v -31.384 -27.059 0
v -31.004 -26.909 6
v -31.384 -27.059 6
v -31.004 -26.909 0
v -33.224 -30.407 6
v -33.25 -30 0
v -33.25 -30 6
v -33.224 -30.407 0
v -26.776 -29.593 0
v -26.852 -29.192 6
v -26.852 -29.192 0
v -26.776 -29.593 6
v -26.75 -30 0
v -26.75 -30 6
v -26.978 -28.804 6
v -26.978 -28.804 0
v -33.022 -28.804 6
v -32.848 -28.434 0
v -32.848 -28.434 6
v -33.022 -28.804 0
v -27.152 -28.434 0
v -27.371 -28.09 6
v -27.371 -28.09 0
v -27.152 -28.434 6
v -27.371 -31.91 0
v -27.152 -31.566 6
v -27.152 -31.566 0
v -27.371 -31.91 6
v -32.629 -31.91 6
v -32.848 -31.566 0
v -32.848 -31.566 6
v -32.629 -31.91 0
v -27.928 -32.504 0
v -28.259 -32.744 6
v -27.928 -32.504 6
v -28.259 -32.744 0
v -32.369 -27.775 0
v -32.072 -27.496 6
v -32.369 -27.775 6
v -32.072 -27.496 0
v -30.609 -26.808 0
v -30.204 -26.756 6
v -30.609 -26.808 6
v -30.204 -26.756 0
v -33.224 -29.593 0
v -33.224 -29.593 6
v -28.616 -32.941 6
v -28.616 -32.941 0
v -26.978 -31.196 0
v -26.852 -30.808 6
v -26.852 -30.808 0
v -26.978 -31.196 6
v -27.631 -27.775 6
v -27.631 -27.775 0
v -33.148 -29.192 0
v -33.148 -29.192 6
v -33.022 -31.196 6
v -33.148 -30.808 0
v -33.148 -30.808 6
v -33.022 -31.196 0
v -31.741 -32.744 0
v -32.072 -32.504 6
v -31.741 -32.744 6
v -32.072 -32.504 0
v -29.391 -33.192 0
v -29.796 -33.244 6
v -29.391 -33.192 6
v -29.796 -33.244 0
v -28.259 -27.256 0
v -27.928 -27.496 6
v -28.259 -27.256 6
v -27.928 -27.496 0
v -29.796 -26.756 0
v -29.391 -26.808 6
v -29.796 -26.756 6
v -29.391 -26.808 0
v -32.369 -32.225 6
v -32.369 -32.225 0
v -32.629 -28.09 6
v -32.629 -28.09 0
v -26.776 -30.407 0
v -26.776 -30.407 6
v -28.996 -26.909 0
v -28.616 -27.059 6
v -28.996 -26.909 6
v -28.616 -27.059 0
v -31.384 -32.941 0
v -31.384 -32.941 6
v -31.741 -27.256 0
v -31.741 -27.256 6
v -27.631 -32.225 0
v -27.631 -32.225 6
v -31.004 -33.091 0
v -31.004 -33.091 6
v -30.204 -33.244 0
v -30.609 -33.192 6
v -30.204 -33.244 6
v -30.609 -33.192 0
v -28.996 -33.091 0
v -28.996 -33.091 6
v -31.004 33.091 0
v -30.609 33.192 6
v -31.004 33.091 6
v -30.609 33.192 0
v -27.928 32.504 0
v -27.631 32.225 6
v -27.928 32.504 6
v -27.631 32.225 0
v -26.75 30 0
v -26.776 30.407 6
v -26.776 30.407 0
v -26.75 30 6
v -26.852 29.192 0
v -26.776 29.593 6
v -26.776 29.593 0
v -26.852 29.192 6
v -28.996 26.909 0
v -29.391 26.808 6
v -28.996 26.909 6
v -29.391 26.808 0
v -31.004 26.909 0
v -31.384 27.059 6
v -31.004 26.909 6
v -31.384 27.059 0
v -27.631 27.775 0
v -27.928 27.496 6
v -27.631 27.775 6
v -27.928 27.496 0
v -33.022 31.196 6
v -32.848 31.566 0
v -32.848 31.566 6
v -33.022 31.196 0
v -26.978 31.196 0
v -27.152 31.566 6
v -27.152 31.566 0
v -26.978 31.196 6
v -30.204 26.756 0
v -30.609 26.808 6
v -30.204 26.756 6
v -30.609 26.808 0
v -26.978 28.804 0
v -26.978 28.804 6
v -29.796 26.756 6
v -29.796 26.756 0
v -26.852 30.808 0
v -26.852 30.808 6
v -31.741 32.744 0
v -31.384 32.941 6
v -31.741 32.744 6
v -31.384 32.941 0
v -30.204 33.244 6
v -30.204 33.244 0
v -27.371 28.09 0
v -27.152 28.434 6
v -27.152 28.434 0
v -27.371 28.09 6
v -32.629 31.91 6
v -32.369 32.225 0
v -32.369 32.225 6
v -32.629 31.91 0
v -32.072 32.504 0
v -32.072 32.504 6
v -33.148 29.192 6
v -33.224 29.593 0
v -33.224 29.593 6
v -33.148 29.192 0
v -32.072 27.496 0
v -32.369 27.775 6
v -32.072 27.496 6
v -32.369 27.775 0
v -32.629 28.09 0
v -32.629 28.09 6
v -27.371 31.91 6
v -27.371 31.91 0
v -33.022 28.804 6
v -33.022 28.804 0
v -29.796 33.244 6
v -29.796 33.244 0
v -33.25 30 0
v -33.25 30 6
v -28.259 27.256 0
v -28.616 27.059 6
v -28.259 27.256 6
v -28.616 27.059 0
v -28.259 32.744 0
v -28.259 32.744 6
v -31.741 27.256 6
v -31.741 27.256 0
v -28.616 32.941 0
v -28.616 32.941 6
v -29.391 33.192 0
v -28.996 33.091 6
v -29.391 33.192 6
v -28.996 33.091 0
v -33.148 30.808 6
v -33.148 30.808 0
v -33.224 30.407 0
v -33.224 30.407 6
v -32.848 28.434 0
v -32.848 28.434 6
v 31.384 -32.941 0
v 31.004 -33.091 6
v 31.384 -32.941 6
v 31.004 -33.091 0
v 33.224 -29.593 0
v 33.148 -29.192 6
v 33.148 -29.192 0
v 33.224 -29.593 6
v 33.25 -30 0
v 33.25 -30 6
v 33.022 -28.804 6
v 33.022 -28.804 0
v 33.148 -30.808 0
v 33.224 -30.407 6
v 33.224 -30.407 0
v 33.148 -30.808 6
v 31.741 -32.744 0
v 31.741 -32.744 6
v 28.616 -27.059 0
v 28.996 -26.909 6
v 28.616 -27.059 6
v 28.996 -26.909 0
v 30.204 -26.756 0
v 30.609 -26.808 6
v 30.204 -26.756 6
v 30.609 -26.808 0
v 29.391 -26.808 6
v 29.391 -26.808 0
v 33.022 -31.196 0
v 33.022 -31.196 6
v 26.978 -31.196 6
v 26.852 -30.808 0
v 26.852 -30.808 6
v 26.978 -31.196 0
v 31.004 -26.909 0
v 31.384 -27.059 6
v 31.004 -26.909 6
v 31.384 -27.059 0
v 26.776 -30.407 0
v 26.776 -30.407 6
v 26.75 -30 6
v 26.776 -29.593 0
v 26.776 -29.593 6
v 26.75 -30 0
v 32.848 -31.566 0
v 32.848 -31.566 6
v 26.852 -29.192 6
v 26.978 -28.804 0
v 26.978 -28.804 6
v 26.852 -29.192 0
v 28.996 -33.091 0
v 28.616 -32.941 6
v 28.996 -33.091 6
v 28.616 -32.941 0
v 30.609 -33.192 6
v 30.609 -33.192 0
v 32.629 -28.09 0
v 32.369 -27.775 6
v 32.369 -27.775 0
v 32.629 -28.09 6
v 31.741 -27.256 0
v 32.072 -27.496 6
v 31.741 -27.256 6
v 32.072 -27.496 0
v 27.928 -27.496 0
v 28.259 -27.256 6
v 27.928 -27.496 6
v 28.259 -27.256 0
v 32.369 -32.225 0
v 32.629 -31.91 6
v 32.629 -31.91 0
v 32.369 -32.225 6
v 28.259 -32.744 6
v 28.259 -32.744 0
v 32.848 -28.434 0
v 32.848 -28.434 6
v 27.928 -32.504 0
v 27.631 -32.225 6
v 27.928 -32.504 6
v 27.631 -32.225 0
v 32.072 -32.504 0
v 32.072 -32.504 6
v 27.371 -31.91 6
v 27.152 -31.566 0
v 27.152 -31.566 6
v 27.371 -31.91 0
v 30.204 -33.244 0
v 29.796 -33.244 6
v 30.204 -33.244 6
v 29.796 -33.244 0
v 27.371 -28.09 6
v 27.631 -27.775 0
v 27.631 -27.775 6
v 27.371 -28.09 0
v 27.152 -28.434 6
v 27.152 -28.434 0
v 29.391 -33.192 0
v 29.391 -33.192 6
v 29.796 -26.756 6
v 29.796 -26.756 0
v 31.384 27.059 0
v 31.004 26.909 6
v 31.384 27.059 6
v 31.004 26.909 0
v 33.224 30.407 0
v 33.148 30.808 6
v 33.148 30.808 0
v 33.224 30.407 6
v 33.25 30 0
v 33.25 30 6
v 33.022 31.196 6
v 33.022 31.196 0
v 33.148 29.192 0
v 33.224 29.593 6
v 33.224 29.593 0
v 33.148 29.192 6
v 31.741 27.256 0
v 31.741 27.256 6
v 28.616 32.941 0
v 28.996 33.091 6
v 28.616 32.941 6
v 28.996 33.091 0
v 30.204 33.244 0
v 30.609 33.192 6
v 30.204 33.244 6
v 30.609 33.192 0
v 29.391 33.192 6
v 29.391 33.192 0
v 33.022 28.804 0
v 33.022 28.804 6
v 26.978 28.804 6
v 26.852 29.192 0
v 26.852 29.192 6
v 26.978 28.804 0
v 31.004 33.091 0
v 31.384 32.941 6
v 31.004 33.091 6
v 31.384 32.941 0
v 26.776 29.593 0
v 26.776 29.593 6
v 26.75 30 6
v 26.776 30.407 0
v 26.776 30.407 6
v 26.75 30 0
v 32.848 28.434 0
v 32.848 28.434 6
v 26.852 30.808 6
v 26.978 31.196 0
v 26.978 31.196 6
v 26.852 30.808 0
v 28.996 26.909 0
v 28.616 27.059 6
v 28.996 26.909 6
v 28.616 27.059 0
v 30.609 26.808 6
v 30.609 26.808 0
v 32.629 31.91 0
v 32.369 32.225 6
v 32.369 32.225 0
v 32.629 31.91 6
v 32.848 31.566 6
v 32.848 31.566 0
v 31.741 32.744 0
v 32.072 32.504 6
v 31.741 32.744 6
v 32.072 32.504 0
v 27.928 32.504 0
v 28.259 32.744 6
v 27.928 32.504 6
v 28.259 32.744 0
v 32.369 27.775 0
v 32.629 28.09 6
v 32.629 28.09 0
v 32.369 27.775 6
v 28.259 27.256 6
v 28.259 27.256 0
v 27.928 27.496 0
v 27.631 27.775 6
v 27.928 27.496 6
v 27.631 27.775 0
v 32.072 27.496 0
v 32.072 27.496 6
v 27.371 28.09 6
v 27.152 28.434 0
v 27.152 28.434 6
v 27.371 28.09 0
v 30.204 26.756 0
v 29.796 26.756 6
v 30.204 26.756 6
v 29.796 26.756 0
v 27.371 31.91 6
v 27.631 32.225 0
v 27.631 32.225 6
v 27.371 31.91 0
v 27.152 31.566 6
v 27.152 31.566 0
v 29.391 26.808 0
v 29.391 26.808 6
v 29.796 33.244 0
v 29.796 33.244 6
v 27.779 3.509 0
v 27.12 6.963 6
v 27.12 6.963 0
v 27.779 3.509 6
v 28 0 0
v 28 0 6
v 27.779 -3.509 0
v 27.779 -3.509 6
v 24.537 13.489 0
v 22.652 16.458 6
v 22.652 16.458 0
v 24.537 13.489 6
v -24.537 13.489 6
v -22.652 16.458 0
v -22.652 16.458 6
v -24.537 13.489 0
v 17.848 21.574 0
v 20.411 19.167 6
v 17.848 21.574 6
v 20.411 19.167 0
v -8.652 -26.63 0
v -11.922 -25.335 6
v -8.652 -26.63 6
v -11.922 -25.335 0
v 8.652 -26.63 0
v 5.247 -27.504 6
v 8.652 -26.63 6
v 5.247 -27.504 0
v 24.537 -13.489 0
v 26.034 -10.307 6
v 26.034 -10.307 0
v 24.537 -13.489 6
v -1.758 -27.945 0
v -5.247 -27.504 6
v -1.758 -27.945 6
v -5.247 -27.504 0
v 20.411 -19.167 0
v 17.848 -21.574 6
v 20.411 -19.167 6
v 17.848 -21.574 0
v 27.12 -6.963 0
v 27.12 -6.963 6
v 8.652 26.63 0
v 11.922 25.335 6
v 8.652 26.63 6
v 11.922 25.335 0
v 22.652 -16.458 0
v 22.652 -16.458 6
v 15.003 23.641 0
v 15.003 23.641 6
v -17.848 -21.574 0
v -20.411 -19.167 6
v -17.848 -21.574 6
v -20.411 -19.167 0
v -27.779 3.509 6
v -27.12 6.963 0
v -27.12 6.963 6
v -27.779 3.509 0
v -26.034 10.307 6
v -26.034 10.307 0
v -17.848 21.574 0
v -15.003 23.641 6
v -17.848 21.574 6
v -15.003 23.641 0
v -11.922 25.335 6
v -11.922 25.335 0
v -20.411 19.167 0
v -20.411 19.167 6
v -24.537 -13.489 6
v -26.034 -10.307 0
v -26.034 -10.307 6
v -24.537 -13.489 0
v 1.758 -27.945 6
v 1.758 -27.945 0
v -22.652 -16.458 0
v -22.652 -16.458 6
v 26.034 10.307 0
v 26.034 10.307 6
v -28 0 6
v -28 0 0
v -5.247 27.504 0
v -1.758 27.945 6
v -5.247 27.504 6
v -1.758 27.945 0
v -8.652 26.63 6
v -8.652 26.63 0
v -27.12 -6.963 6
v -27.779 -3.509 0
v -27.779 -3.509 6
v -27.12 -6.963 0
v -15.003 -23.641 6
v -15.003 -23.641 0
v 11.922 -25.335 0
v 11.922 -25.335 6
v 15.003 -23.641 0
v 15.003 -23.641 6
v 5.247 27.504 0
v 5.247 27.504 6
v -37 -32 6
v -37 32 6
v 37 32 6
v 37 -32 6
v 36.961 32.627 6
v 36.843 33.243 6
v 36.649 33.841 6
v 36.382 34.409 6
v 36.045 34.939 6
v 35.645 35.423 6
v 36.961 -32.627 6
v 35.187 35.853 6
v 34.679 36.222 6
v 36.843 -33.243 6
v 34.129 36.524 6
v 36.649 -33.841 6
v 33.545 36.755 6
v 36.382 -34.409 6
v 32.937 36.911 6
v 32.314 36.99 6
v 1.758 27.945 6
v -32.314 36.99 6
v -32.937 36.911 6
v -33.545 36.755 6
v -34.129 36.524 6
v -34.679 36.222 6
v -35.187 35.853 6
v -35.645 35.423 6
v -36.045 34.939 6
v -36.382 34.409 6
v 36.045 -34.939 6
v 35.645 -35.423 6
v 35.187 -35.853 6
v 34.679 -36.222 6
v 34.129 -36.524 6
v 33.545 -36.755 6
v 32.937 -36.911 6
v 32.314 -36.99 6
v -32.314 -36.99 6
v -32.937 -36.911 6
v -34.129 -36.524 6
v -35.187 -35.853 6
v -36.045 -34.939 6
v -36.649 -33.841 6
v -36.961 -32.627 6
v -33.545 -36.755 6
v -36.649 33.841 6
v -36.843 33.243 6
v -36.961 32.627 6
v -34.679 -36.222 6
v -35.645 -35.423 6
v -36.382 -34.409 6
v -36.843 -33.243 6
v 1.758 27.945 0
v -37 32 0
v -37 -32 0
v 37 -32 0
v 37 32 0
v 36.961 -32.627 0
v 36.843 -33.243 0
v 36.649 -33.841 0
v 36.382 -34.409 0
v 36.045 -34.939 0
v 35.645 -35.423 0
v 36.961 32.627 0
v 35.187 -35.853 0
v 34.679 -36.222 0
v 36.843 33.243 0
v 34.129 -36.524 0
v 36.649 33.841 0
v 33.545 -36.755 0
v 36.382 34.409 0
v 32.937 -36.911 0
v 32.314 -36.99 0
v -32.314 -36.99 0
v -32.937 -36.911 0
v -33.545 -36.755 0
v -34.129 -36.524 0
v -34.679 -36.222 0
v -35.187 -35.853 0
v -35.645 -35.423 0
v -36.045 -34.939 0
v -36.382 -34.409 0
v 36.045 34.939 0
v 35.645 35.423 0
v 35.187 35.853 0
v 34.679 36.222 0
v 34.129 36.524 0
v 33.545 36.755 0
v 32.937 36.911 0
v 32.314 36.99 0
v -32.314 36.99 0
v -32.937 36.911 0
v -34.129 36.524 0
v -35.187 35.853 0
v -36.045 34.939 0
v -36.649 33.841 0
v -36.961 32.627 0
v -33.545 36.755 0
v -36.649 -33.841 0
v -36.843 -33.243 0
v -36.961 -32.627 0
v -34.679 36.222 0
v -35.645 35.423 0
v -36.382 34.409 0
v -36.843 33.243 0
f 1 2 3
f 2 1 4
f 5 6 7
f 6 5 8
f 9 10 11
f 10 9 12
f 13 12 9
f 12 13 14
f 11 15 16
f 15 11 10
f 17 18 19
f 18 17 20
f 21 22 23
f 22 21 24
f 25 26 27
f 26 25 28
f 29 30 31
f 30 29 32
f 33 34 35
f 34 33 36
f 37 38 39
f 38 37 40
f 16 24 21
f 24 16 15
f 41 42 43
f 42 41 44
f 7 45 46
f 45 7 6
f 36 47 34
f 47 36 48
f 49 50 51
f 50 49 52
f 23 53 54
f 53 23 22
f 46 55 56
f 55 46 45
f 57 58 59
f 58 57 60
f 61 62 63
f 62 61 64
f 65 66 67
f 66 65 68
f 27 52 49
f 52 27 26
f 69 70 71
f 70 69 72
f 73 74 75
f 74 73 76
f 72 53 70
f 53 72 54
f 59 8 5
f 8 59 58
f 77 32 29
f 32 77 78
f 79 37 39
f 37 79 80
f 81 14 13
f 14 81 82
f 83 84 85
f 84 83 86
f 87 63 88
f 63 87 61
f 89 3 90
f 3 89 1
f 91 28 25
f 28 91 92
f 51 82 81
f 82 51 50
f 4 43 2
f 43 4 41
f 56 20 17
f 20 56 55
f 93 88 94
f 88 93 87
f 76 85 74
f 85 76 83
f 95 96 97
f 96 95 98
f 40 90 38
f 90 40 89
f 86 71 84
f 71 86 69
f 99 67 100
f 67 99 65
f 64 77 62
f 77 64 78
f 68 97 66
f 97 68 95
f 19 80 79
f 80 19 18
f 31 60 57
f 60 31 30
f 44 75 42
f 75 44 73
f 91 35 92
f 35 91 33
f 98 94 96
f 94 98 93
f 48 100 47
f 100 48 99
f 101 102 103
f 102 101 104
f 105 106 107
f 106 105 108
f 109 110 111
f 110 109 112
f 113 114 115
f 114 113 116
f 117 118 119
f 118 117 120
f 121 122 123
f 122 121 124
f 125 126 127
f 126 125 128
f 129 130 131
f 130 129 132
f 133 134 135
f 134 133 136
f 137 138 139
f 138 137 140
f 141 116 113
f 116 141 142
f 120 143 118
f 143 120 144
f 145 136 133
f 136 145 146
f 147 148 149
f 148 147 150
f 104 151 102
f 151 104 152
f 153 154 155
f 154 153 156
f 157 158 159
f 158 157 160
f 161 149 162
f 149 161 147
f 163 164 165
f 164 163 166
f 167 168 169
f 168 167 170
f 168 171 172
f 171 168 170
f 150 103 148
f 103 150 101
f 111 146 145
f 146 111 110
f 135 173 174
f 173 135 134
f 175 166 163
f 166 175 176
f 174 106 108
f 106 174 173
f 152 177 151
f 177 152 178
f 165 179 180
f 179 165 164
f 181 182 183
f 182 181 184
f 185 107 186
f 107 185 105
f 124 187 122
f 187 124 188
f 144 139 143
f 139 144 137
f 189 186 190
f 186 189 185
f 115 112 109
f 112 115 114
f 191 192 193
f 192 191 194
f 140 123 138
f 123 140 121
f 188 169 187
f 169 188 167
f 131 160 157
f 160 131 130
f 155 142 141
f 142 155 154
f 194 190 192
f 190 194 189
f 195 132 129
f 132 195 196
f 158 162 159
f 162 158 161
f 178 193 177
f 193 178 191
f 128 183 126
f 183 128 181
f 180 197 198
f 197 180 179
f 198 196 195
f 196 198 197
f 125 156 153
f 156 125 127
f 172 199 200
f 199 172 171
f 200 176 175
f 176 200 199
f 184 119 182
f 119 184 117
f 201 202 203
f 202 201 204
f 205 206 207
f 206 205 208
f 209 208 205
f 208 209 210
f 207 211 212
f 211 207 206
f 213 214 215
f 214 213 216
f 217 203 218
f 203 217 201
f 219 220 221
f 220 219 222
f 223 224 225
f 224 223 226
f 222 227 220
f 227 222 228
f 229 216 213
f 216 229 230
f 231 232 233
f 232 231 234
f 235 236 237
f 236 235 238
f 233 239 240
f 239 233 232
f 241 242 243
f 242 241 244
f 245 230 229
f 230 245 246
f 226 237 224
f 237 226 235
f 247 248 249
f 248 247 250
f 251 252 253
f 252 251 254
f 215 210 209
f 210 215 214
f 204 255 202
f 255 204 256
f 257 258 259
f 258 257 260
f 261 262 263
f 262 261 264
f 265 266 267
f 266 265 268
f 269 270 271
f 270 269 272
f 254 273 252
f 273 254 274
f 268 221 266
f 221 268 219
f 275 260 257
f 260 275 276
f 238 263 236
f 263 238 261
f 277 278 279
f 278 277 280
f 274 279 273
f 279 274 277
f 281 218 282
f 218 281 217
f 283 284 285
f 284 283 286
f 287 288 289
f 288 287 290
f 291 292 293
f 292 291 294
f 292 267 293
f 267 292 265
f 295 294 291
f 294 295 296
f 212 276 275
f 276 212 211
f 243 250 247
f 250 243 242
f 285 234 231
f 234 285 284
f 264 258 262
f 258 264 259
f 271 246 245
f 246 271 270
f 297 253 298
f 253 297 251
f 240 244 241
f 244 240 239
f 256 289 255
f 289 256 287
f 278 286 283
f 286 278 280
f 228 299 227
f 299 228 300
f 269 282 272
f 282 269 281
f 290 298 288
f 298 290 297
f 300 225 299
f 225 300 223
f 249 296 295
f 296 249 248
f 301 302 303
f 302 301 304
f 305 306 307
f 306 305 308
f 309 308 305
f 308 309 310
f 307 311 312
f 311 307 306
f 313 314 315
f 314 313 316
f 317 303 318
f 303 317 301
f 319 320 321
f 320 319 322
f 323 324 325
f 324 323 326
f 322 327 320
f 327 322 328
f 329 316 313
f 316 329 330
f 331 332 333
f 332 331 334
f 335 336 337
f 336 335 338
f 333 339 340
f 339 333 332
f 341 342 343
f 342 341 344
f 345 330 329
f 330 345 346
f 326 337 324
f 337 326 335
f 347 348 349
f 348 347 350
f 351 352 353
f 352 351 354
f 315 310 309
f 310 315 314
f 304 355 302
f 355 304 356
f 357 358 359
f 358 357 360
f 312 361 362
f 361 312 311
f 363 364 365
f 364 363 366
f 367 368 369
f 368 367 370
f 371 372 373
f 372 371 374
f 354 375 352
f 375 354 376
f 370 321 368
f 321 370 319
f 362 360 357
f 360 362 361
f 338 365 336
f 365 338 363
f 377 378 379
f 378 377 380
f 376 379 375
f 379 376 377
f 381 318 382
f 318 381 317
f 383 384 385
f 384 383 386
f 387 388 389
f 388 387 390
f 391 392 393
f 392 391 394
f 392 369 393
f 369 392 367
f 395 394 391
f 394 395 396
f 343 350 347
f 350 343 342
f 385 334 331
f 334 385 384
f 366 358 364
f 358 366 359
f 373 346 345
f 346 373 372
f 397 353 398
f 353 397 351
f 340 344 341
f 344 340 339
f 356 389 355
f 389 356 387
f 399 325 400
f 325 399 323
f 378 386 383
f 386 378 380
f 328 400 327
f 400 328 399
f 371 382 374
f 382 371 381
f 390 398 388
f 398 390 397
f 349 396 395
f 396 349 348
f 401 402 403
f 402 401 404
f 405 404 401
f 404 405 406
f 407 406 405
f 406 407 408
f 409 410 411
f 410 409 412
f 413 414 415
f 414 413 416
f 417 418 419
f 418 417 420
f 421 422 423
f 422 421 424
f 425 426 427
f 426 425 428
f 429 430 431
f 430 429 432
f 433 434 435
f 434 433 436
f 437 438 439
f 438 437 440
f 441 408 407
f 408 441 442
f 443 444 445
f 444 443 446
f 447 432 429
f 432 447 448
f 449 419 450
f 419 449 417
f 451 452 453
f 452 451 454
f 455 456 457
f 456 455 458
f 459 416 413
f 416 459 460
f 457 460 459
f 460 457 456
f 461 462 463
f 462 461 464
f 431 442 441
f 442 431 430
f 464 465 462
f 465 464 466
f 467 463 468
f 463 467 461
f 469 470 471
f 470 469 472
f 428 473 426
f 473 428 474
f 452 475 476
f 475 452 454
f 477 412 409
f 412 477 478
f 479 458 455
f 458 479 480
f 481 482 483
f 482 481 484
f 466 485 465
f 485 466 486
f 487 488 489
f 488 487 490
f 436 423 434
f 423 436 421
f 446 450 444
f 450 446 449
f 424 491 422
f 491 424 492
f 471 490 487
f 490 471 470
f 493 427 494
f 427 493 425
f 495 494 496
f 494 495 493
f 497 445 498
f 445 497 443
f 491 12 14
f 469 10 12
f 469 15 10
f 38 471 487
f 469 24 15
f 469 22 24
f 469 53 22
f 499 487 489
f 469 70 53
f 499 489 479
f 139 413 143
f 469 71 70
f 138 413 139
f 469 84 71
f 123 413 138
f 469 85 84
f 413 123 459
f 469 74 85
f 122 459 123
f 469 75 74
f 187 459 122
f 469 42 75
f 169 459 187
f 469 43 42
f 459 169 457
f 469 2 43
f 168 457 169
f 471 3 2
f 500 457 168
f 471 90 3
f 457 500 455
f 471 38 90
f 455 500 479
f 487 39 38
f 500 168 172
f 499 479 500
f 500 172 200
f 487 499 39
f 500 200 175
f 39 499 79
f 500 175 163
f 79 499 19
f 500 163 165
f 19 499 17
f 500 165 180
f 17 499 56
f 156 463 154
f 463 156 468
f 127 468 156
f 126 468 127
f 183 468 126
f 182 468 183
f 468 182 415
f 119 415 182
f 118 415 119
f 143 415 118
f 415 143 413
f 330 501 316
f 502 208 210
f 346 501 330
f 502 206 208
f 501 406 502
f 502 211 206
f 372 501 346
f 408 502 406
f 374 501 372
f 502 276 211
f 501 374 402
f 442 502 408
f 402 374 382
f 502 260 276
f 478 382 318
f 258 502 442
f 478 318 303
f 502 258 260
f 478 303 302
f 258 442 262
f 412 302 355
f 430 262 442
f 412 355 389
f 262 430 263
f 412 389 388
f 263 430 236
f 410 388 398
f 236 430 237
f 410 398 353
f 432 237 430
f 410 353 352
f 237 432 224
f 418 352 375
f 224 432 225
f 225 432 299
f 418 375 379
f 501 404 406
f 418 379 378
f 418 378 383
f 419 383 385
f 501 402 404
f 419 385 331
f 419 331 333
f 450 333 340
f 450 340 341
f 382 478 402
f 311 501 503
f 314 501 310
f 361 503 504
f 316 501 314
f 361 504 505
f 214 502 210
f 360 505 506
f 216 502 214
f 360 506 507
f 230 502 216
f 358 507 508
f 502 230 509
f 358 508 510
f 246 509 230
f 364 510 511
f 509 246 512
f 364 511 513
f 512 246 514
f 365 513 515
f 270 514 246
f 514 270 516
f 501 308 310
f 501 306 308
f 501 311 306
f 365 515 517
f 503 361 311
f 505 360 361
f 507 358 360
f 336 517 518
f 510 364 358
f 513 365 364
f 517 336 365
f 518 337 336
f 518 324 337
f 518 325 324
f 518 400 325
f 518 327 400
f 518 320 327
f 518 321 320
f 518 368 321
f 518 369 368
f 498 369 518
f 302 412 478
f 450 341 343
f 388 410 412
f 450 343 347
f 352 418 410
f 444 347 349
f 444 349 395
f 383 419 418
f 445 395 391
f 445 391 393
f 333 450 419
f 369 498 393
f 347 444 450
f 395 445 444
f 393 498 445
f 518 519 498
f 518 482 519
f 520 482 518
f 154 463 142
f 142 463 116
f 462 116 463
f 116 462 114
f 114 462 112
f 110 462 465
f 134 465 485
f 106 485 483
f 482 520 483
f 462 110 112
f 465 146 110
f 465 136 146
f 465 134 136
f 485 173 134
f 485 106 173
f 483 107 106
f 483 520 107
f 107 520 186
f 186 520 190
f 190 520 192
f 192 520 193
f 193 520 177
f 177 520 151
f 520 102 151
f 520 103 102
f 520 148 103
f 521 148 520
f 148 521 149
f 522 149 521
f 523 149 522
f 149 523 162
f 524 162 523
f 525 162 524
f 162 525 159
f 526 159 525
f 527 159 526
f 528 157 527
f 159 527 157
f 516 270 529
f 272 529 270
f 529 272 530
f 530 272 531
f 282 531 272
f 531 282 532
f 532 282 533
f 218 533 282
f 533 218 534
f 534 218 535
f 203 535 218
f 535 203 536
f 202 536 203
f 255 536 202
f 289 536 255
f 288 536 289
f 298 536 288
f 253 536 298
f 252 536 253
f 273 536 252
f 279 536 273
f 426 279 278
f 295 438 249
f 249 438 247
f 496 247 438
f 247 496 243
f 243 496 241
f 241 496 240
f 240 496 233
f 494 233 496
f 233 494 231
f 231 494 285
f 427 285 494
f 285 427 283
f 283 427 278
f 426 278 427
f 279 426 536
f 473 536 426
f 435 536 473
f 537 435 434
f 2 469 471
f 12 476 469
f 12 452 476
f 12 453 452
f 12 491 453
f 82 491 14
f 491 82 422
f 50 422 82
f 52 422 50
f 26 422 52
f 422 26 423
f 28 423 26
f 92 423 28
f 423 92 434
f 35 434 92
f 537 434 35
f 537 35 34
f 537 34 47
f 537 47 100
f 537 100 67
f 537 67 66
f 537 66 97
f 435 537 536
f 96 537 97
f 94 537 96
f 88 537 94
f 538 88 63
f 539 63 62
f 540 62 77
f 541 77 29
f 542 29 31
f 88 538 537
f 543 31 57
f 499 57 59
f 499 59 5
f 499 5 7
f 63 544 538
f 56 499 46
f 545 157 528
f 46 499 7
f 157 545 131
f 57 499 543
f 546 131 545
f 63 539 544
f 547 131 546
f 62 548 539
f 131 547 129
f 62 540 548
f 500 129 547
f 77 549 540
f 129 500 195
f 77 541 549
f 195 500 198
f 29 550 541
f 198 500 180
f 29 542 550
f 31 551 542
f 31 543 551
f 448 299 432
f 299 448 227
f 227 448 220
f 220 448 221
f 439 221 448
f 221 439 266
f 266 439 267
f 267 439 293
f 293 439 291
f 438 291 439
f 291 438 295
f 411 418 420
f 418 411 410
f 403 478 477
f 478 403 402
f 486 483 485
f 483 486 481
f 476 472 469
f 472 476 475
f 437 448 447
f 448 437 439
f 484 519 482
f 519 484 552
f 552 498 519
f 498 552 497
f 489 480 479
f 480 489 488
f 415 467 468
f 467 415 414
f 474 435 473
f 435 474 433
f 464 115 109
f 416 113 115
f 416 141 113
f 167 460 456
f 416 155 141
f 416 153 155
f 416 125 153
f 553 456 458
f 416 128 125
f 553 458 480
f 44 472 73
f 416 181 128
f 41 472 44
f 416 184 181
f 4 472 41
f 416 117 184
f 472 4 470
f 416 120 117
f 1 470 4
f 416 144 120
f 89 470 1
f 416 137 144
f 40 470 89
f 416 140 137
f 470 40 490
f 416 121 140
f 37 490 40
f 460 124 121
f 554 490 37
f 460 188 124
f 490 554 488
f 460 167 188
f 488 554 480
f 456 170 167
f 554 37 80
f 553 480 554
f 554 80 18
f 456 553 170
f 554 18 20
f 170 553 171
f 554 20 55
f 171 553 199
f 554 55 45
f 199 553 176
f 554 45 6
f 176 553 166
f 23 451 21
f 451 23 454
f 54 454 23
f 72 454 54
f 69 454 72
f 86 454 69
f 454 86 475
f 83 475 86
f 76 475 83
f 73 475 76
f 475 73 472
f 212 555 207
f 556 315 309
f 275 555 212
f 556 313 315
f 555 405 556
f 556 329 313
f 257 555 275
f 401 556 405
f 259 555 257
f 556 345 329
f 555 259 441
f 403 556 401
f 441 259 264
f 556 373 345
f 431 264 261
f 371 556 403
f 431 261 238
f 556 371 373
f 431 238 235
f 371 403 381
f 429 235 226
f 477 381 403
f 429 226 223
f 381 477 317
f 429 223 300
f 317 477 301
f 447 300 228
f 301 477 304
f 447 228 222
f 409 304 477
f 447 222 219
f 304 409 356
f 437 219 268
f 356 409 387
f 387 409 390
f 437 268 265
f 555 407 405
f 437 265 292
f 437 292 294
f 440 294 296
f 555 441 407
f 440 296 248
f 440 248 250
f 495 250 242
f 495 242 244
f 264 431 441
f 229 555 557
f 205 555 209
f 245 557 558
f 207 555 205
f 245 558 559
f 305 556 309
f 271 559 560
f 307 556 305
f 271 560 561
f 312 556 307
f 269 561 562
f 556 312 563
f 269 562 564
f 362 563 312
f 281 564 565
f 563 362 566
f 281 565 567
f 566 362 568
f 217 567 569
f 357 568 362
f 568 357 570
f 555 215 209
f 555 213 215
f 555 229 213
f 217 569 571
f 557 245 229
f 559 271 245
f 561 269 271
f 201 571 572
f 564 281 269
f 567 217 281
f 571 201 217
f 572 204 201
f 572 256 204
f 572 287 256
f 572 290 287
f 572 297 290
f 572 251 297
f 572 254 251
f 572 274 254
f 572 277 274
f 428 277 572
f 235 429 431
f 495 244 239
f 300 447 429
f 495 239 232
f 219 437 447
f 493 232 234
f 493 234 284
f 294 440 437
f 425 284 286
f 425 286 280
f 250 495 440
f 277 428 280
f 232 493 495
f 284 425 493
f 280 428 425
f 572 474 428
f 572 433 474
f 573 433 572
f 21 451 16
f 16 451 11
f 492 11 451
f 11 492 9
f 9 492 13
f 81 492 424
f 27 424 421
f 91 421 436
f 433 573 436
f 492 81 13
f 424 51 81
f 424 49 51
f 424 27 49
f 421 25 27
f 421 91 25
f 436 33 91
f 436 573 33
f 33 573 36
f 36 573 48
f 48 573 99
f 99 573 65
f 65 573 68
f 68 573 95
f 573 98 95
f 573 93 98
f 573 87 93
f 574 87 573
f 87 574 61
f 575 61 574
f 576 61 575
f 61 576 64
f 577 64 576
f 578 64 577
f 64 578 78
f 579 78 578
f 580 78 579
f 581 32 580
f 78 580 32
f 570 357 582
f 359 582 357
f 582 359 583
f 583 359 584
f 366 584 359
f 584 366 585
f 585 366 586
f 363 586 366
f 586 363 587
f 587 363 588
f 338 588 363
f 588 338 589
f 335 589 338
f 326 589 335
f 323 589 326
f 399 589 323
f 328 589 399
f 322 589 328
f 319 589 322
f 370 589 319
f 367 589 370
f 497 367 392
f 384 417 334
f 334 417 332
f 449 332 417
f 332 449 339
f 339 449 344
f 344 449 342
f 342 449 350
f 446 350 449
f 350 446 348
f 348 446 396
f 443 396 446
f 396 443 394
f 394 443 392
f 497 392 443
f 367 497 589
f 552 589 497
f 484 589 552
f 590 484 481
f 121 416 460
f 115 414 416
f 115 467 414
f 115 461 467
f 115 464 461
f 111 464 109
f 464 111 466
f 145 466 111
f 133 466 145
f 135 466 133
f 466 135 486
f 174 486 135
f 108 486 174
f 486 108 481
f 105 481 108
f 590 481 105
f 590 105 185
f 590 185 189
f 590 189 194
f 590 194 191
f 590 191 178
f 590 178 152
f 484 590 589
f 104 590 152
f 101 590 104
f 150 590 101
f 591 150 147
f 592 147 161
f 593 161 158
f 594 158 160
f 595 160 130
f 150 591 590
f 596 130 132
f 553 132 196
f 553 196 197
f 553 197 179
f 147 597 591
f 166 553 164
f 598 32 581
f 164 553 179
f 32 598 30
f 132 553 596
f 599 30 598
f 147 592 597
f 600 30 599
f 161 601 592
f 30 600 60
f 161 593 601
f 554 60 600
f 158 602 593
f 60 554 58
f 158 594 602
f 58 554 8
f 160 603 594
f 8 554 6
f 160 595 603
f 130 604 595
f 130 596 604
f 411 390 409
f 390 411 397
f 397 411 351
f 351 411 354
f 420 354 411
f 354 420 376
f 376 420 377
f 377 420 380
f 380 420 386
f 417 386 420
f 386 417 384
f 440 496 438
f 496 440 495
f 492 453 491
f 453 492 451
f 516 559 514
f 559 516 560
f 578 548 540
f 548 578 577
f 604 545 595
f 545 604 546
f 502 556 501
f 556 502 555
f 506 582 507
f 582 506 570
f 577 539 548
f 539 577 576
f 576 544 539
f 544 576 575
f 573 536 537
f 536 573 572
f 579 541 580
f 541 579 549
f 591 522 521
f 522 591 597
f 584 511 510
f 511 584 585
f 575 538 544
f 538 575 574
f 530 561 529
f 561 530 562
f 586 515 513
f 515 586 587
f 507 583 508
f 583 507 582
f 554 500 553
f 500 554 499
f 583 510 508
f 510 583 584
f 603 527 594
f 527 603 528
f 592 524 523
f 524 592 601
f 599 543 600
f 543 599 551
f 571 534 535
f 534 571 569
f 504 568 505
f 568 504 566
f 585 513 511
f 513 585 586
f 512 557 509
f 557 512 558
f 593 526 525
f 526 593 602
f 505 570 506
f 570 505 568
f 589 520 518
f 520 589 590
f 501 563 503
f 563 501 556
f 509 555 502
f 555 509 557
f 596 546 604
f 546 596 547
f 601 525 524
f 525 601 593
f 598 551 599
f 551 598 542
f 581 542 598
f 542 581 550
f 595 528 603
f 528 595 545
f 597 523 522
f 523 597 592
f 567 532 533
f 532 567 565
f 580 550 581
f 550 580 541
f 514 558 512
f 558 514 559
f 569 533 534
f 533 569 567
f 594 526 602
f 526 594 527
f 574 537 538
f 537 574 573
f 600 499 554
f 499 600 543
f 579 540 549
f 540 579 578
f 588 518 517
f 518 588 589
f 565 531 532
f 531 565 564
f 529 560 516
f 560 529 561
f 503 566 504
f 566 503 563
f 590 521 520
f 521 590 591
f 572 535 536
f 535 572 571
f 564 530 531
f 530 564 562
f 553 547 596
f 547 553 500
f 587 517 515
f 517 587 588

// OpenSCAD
$fn = 50;


difference() {
	union() {
		hull() {
			translate(v = [-32.0000000000, 32.0000000000, 0]) {
				cylinder(h = 6, r = 5);
			}
			translate(v = [32.0000000000, 32.0000000000, 0]) {
				cylinder(h = 6, r = 5);
			}
			translate(v = [-32.0000000000, -32.0000000000, 0]) {
				cylinder(h = 6, r = 5);
			}
			translate(v = [32.0000000000, -32.0000000000, 0]) {
				cylinder(h = 6, r = 5);
			}
		}
	}
	union() {
		#translate(v = [-30.0000000000, -30.0000000000, -100.0000000000]) {
			cylinder(h = 200, r = 3.2500000000);
		}
		#translate(v = [-30.0000000000, 30.0000000000, -100.0000000000]) {
			cylinder(h = 200, r = 3.2500000000);
		}
		#translate(v = [30.0000000000, -30.0000000000, -100.0000000000]) {
			cylinder(h = 200, r = 3.2500000000);
		}
		#translate(v = [30.0000000000, 30.0000000000, -100.0000000000]) {
			cylinder(h = 200, r = 3.2500000000);
		}
		#cylinder(h = 6, r = 28.0000000000);
	}
}
